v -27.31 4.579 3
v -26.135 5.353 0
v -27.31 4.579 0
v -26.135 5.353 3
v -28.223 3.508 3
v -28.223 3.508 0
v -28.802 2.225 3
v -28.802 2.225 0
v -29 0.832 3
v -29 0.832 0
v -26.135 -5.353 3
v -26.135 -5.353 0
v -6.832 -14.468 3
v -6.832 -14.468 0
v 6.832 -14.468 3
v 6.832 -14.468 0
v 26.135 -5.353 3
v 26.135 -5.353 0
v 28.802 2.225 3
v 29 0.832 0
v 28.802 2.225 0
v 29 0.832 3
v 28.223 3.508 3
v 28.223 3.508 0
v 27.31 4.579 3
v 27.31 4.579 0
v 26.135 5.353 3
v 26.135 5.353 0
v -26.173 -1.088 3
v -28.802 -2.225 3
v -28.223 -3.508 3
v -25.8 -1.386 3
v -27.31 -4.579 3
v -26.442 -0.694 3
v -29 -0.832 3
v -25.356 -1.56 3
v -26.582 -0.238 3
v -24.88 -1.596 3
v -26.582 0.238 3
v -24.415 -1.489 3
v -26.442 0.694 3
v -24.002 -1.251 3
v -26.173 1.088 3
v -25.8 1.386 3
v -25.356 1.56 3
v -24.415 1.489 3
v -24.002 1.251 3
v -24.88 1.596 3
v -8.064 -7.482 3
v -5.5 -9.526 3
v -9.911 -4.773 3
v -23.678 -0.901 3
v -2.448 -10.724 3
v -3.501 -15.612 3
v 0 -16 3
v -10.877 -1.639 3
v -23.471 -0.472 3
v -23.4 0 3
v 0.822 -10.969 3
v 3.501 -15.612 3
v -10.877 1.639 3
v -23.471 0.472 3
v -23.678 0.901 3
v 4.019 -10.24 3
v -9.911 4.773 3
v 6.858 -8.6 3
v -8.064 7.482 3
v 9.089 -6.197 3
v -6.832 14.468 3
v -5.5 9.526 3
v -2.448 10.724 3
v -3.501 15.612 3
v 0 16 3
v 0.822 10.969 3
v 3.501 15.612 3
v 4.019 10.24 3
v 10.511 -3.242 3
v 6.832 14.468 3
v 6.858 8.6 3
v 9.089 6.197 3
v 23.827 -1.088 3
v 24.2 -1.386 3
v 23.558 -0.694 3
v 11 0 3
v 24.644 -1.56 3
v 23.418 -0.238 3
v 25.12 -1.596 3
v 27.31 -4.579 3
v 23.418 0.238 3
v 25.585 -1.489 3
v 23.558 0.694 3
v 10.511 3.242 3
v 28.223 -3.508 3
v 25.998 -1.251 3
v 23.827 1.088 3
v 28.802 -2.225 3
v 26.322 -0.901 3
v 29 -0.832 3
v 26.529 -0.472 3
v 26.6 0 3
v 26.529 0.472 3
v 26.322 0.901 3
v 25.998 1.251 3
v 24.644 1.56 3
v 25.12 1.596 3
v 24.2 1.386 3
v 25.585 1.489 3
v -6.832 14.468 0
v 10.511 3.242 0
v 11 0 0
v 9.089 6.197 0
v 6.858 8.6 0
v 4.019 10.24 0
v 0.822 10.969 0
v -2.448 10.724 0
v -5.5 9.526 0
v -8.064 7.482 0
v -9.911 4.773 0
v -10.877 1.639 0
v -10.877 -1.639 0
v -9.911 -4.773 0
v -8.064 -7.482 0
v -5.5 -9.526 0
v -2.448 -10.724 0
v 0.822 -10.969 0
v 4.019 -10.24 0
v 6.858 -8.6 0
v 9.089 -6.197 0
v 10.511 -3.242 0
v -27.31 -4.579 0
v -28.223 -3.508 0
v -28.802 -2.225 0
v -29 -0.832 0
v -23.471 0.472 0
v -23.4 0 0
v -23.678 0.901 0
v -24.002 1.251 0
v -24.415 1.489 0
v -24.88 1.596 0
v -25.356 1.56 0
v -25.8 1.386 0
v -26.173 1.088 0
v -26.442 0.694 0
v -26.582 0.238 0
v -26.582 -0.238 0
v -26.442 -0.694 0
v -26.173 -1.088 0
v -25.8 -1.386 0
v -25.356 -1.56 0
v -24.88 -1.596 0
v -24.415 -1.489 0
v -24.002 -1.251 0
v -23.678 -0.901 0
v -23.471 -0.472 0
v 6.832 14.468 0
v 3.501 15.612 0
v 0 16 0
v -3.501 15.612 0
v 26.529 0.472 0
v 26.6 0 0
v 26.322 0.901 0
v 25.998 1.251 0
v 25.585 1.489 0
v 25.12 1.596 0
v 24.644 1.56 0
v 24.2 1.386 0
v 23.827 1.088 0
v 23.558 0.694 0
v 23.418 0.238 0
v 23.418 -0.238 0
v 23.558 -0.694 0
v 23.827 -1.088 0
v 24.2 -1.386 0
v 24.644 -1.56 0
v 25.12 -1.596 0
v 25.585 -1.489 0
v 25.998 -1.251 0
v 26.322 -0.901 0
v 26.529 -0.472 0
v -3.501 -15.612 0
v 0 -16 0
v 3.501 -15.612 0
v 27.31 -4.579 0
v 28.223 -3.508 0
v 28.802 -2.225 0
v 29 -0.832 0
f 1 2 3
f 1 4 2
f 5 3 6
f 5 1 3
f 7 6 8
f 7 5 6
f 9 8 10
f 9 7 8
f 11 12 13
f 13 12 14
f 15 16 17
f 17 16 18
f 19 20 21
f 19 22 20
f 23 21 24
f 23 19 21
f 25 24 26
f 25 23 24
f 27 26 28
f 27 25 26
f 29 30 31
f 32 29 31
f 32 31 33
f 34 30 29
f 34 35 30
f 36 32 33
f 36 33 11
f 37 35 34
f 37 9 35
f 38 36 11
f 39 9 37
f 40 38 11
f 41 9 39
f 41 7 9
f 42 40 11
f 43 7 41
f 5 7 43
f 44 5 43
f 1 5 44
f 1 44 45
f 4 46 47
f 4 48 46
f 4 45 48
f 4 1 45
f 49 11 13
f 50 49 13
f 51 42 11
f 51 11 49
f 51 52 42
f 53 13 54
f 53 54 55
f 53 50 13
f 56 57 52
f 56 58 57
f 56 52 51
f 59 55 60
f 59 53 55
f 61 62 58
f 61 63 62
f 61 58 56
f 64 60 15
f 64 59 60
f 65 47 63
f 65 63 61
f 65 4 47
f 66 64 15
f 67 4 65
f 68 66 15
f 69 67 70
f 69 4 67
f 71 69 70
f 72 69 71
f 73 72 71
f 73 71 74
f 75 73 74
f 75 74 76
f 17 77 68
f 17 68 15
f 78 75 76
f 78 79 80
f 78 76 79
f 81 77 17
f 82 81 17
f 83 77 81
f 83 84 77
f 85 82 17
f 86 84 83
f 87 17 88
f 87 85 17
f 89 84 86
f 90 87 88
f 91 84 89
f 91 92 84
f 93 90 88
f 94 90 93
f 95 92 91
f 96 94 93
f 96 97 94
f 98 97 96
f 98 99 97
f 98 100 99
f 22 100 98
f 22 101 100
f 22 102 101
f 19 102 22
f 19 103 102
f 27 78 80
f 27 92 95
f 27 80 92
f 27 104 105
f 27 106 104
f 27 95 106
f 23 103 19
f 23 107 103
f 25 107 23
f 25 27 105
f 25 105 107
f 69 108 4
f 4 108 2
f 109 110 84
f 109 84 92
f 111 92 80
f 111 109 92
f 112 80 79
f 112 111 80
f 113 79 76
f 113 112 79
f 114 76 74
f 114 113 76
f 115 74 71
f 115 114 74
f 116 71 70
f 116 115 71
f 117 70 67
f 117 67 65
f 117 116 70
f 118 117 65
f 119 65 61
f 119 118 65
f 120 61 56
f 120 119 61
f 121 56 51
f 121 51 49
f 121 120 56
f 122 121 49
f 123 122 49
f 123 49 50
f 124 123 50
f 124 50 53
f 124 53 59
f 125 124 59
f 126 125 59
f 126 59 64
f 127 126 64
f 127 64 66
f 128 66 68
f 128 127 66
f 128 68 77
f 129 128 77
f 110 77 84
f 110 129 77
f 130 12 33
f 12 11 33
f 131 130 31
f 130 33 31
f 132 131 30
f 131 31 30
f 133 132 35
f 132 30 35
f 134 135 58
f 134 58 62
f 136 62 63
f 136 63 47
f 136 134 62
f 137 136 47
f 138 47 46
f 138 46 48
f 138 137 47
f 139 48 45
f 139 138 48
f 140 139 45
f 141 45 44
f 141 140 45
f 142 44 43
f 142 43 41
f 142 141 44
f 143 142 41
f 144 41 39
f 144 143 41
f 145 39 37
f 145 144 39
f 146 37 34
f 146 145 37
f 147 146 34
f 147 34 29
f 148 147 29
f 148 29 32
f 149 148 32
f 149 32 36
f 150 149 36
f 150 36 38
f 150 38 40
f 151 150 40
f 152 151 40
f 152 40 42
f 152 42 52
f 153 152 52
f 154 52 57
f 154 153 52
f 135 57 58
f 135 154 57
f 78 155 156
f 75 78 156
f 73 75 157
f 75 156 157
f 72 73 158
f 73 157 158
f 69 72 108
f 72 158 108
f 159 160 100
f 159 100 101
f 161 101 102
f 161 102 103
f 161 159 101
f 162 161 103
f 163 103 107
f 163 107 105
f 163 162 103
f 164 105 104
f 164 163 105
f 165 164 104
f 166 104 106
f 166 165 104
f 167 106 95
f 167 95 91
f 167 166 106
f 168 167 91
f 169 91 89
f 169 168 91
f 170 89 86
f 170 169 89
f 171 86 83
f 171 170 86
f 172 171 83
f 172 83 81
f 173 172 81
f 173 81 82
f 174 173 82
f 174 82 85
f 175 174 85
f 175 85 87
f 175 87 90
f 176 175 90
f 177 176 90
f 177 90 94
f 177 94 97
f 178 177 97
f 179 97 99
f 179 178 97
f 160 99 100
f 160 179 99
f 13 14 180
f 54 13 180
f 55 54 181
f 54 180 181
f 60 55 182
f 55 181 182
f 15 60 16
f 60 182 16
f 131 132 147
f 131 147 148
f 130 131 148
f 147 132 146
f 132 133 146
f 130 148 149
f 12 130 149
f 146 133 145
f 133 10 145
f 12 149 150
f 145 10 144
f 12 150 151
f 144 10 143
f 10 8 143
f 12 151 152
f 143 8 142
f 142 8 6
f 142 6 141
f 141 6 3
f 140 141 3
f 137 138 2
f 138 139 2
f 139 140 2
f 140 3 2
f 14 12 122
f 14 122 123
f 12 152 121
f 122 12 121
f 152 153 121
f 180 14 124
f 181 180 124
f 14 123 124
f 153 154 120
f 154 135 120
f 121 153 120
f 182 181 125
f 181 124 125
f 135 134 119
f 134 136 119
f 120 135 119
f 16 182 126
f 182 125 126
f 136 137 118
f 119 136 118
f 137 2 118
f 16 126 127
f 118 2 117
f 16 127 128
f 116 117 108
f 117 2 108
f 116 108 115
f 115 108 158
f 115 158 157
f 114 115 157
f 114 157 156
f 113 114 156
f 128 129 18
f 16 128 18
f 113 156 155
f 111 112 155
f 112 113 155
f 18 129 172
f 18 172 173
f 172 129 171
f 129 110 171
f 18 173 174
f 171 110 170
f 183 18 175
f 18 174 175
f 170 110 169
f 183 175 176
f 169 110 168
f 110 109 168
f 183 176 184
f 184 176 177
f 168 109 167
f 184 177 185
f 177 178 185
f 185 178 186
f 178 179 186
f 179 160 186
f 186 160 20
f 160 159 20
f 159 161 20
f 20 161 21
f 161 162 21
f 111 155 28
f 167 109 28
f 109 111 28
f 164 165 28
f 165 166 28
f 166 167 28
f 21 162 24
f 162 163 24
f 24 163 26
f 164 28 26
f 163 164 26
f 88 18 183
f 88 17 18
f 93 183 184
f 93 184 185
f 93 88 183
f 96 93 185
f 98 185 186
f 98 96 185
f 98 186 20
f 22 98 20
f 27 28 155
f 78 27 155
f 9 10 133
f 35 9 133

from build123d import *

# Parameters (mm, degrees)
ESBO_O1_R                = 11
ESBO_O1_R_2              = 1.6
RESSALTO_EXTRUS_O1_DEPTH = 3
FILETE1_R                = 5


with BuildPart() as part:
    # Esboço1 → Ressalto-extrusão1 (new body)
    with BuildSketch(Plane.XY):
        with BuildLine():
            Line((-15.491933385, -4), (-29, -4))
            Line((-29, -4), (-6.831996166, -14.468027799))
            ThreePointArc((-6.831996166, -14.468027799), (-12.328193669, -10.198805854), (-15.491933385, -4))
        make_face()
        with BuildLine():
            Line((-29, -4), (-15.491933385, -4))
            ThreePointArc((-15.491933385, -4), (0, -16), (15.491933385, -4))
            Line((15.491933385, -4), (29, -4))
            Line((29, -4), (29, 4))
            Line((29, 4), (15.491933385, 4))
            ThreePointArc((15.491933385, 4), (0, 16), (-15.491933385, 4))
            Line((-15.491933385, 4), (-29, 4))
            Line((-29, 4), (-29, -4))
        make_face()
        Circle(ESBO_O1_R, mode=Mode.SUBTRACT)
        with Locations((-25, 0)):
            Circle(ESBO_O1_R_2, mode=Mode.SUBTRACT)
        with Locations((25, 0)):
            Circle(ESBO_O1_R_2, mode=Mode.SUBTRACT)
        with BuildLine():
            Line((-6.831996166, 14.468027799), (-29, 4))
            Line((-29, 4), (-15.491933385, 4))
            ThreePointArc((-15.491933385, 4), (-12.328193669, 10.198805854), (-6.831996166, 14.468027799))
        make_face()
        with BuildLine():
            ThreePointArc((15.491933385, -4), (12.328193669, -10.198805854), (6.831996166, -14.468027799))
            Line((6.831996166, -14.468027799), (29, -4))
            Line((29, -4), (15.491933385, -4))
        make_face()
        with BuildLine():
            Line((29, 4), (6.831996166, 14.468027799))
            ThreePointArc((6.831996166, 14.468027799), (12.328193669, 10.198805854), (15.491933385, 4))
            Line((15.491933385, 4), (29, 4))
        make_face()
    extrude(amount=RESSALTO_EXTRUS_O1_DEPTH)

    # Filete1
    filete1_edges = [part.edges().sort_by_distance(p)[0] for p in [
        (29, 4, 1.5),
        (29, -4, 1.5),
        (-29, -4, 1.5),
        (-29, 4, 1.5),
    ]]
    fillet(filete1_edges, radius=FILETE1_R)


solid = part.part
